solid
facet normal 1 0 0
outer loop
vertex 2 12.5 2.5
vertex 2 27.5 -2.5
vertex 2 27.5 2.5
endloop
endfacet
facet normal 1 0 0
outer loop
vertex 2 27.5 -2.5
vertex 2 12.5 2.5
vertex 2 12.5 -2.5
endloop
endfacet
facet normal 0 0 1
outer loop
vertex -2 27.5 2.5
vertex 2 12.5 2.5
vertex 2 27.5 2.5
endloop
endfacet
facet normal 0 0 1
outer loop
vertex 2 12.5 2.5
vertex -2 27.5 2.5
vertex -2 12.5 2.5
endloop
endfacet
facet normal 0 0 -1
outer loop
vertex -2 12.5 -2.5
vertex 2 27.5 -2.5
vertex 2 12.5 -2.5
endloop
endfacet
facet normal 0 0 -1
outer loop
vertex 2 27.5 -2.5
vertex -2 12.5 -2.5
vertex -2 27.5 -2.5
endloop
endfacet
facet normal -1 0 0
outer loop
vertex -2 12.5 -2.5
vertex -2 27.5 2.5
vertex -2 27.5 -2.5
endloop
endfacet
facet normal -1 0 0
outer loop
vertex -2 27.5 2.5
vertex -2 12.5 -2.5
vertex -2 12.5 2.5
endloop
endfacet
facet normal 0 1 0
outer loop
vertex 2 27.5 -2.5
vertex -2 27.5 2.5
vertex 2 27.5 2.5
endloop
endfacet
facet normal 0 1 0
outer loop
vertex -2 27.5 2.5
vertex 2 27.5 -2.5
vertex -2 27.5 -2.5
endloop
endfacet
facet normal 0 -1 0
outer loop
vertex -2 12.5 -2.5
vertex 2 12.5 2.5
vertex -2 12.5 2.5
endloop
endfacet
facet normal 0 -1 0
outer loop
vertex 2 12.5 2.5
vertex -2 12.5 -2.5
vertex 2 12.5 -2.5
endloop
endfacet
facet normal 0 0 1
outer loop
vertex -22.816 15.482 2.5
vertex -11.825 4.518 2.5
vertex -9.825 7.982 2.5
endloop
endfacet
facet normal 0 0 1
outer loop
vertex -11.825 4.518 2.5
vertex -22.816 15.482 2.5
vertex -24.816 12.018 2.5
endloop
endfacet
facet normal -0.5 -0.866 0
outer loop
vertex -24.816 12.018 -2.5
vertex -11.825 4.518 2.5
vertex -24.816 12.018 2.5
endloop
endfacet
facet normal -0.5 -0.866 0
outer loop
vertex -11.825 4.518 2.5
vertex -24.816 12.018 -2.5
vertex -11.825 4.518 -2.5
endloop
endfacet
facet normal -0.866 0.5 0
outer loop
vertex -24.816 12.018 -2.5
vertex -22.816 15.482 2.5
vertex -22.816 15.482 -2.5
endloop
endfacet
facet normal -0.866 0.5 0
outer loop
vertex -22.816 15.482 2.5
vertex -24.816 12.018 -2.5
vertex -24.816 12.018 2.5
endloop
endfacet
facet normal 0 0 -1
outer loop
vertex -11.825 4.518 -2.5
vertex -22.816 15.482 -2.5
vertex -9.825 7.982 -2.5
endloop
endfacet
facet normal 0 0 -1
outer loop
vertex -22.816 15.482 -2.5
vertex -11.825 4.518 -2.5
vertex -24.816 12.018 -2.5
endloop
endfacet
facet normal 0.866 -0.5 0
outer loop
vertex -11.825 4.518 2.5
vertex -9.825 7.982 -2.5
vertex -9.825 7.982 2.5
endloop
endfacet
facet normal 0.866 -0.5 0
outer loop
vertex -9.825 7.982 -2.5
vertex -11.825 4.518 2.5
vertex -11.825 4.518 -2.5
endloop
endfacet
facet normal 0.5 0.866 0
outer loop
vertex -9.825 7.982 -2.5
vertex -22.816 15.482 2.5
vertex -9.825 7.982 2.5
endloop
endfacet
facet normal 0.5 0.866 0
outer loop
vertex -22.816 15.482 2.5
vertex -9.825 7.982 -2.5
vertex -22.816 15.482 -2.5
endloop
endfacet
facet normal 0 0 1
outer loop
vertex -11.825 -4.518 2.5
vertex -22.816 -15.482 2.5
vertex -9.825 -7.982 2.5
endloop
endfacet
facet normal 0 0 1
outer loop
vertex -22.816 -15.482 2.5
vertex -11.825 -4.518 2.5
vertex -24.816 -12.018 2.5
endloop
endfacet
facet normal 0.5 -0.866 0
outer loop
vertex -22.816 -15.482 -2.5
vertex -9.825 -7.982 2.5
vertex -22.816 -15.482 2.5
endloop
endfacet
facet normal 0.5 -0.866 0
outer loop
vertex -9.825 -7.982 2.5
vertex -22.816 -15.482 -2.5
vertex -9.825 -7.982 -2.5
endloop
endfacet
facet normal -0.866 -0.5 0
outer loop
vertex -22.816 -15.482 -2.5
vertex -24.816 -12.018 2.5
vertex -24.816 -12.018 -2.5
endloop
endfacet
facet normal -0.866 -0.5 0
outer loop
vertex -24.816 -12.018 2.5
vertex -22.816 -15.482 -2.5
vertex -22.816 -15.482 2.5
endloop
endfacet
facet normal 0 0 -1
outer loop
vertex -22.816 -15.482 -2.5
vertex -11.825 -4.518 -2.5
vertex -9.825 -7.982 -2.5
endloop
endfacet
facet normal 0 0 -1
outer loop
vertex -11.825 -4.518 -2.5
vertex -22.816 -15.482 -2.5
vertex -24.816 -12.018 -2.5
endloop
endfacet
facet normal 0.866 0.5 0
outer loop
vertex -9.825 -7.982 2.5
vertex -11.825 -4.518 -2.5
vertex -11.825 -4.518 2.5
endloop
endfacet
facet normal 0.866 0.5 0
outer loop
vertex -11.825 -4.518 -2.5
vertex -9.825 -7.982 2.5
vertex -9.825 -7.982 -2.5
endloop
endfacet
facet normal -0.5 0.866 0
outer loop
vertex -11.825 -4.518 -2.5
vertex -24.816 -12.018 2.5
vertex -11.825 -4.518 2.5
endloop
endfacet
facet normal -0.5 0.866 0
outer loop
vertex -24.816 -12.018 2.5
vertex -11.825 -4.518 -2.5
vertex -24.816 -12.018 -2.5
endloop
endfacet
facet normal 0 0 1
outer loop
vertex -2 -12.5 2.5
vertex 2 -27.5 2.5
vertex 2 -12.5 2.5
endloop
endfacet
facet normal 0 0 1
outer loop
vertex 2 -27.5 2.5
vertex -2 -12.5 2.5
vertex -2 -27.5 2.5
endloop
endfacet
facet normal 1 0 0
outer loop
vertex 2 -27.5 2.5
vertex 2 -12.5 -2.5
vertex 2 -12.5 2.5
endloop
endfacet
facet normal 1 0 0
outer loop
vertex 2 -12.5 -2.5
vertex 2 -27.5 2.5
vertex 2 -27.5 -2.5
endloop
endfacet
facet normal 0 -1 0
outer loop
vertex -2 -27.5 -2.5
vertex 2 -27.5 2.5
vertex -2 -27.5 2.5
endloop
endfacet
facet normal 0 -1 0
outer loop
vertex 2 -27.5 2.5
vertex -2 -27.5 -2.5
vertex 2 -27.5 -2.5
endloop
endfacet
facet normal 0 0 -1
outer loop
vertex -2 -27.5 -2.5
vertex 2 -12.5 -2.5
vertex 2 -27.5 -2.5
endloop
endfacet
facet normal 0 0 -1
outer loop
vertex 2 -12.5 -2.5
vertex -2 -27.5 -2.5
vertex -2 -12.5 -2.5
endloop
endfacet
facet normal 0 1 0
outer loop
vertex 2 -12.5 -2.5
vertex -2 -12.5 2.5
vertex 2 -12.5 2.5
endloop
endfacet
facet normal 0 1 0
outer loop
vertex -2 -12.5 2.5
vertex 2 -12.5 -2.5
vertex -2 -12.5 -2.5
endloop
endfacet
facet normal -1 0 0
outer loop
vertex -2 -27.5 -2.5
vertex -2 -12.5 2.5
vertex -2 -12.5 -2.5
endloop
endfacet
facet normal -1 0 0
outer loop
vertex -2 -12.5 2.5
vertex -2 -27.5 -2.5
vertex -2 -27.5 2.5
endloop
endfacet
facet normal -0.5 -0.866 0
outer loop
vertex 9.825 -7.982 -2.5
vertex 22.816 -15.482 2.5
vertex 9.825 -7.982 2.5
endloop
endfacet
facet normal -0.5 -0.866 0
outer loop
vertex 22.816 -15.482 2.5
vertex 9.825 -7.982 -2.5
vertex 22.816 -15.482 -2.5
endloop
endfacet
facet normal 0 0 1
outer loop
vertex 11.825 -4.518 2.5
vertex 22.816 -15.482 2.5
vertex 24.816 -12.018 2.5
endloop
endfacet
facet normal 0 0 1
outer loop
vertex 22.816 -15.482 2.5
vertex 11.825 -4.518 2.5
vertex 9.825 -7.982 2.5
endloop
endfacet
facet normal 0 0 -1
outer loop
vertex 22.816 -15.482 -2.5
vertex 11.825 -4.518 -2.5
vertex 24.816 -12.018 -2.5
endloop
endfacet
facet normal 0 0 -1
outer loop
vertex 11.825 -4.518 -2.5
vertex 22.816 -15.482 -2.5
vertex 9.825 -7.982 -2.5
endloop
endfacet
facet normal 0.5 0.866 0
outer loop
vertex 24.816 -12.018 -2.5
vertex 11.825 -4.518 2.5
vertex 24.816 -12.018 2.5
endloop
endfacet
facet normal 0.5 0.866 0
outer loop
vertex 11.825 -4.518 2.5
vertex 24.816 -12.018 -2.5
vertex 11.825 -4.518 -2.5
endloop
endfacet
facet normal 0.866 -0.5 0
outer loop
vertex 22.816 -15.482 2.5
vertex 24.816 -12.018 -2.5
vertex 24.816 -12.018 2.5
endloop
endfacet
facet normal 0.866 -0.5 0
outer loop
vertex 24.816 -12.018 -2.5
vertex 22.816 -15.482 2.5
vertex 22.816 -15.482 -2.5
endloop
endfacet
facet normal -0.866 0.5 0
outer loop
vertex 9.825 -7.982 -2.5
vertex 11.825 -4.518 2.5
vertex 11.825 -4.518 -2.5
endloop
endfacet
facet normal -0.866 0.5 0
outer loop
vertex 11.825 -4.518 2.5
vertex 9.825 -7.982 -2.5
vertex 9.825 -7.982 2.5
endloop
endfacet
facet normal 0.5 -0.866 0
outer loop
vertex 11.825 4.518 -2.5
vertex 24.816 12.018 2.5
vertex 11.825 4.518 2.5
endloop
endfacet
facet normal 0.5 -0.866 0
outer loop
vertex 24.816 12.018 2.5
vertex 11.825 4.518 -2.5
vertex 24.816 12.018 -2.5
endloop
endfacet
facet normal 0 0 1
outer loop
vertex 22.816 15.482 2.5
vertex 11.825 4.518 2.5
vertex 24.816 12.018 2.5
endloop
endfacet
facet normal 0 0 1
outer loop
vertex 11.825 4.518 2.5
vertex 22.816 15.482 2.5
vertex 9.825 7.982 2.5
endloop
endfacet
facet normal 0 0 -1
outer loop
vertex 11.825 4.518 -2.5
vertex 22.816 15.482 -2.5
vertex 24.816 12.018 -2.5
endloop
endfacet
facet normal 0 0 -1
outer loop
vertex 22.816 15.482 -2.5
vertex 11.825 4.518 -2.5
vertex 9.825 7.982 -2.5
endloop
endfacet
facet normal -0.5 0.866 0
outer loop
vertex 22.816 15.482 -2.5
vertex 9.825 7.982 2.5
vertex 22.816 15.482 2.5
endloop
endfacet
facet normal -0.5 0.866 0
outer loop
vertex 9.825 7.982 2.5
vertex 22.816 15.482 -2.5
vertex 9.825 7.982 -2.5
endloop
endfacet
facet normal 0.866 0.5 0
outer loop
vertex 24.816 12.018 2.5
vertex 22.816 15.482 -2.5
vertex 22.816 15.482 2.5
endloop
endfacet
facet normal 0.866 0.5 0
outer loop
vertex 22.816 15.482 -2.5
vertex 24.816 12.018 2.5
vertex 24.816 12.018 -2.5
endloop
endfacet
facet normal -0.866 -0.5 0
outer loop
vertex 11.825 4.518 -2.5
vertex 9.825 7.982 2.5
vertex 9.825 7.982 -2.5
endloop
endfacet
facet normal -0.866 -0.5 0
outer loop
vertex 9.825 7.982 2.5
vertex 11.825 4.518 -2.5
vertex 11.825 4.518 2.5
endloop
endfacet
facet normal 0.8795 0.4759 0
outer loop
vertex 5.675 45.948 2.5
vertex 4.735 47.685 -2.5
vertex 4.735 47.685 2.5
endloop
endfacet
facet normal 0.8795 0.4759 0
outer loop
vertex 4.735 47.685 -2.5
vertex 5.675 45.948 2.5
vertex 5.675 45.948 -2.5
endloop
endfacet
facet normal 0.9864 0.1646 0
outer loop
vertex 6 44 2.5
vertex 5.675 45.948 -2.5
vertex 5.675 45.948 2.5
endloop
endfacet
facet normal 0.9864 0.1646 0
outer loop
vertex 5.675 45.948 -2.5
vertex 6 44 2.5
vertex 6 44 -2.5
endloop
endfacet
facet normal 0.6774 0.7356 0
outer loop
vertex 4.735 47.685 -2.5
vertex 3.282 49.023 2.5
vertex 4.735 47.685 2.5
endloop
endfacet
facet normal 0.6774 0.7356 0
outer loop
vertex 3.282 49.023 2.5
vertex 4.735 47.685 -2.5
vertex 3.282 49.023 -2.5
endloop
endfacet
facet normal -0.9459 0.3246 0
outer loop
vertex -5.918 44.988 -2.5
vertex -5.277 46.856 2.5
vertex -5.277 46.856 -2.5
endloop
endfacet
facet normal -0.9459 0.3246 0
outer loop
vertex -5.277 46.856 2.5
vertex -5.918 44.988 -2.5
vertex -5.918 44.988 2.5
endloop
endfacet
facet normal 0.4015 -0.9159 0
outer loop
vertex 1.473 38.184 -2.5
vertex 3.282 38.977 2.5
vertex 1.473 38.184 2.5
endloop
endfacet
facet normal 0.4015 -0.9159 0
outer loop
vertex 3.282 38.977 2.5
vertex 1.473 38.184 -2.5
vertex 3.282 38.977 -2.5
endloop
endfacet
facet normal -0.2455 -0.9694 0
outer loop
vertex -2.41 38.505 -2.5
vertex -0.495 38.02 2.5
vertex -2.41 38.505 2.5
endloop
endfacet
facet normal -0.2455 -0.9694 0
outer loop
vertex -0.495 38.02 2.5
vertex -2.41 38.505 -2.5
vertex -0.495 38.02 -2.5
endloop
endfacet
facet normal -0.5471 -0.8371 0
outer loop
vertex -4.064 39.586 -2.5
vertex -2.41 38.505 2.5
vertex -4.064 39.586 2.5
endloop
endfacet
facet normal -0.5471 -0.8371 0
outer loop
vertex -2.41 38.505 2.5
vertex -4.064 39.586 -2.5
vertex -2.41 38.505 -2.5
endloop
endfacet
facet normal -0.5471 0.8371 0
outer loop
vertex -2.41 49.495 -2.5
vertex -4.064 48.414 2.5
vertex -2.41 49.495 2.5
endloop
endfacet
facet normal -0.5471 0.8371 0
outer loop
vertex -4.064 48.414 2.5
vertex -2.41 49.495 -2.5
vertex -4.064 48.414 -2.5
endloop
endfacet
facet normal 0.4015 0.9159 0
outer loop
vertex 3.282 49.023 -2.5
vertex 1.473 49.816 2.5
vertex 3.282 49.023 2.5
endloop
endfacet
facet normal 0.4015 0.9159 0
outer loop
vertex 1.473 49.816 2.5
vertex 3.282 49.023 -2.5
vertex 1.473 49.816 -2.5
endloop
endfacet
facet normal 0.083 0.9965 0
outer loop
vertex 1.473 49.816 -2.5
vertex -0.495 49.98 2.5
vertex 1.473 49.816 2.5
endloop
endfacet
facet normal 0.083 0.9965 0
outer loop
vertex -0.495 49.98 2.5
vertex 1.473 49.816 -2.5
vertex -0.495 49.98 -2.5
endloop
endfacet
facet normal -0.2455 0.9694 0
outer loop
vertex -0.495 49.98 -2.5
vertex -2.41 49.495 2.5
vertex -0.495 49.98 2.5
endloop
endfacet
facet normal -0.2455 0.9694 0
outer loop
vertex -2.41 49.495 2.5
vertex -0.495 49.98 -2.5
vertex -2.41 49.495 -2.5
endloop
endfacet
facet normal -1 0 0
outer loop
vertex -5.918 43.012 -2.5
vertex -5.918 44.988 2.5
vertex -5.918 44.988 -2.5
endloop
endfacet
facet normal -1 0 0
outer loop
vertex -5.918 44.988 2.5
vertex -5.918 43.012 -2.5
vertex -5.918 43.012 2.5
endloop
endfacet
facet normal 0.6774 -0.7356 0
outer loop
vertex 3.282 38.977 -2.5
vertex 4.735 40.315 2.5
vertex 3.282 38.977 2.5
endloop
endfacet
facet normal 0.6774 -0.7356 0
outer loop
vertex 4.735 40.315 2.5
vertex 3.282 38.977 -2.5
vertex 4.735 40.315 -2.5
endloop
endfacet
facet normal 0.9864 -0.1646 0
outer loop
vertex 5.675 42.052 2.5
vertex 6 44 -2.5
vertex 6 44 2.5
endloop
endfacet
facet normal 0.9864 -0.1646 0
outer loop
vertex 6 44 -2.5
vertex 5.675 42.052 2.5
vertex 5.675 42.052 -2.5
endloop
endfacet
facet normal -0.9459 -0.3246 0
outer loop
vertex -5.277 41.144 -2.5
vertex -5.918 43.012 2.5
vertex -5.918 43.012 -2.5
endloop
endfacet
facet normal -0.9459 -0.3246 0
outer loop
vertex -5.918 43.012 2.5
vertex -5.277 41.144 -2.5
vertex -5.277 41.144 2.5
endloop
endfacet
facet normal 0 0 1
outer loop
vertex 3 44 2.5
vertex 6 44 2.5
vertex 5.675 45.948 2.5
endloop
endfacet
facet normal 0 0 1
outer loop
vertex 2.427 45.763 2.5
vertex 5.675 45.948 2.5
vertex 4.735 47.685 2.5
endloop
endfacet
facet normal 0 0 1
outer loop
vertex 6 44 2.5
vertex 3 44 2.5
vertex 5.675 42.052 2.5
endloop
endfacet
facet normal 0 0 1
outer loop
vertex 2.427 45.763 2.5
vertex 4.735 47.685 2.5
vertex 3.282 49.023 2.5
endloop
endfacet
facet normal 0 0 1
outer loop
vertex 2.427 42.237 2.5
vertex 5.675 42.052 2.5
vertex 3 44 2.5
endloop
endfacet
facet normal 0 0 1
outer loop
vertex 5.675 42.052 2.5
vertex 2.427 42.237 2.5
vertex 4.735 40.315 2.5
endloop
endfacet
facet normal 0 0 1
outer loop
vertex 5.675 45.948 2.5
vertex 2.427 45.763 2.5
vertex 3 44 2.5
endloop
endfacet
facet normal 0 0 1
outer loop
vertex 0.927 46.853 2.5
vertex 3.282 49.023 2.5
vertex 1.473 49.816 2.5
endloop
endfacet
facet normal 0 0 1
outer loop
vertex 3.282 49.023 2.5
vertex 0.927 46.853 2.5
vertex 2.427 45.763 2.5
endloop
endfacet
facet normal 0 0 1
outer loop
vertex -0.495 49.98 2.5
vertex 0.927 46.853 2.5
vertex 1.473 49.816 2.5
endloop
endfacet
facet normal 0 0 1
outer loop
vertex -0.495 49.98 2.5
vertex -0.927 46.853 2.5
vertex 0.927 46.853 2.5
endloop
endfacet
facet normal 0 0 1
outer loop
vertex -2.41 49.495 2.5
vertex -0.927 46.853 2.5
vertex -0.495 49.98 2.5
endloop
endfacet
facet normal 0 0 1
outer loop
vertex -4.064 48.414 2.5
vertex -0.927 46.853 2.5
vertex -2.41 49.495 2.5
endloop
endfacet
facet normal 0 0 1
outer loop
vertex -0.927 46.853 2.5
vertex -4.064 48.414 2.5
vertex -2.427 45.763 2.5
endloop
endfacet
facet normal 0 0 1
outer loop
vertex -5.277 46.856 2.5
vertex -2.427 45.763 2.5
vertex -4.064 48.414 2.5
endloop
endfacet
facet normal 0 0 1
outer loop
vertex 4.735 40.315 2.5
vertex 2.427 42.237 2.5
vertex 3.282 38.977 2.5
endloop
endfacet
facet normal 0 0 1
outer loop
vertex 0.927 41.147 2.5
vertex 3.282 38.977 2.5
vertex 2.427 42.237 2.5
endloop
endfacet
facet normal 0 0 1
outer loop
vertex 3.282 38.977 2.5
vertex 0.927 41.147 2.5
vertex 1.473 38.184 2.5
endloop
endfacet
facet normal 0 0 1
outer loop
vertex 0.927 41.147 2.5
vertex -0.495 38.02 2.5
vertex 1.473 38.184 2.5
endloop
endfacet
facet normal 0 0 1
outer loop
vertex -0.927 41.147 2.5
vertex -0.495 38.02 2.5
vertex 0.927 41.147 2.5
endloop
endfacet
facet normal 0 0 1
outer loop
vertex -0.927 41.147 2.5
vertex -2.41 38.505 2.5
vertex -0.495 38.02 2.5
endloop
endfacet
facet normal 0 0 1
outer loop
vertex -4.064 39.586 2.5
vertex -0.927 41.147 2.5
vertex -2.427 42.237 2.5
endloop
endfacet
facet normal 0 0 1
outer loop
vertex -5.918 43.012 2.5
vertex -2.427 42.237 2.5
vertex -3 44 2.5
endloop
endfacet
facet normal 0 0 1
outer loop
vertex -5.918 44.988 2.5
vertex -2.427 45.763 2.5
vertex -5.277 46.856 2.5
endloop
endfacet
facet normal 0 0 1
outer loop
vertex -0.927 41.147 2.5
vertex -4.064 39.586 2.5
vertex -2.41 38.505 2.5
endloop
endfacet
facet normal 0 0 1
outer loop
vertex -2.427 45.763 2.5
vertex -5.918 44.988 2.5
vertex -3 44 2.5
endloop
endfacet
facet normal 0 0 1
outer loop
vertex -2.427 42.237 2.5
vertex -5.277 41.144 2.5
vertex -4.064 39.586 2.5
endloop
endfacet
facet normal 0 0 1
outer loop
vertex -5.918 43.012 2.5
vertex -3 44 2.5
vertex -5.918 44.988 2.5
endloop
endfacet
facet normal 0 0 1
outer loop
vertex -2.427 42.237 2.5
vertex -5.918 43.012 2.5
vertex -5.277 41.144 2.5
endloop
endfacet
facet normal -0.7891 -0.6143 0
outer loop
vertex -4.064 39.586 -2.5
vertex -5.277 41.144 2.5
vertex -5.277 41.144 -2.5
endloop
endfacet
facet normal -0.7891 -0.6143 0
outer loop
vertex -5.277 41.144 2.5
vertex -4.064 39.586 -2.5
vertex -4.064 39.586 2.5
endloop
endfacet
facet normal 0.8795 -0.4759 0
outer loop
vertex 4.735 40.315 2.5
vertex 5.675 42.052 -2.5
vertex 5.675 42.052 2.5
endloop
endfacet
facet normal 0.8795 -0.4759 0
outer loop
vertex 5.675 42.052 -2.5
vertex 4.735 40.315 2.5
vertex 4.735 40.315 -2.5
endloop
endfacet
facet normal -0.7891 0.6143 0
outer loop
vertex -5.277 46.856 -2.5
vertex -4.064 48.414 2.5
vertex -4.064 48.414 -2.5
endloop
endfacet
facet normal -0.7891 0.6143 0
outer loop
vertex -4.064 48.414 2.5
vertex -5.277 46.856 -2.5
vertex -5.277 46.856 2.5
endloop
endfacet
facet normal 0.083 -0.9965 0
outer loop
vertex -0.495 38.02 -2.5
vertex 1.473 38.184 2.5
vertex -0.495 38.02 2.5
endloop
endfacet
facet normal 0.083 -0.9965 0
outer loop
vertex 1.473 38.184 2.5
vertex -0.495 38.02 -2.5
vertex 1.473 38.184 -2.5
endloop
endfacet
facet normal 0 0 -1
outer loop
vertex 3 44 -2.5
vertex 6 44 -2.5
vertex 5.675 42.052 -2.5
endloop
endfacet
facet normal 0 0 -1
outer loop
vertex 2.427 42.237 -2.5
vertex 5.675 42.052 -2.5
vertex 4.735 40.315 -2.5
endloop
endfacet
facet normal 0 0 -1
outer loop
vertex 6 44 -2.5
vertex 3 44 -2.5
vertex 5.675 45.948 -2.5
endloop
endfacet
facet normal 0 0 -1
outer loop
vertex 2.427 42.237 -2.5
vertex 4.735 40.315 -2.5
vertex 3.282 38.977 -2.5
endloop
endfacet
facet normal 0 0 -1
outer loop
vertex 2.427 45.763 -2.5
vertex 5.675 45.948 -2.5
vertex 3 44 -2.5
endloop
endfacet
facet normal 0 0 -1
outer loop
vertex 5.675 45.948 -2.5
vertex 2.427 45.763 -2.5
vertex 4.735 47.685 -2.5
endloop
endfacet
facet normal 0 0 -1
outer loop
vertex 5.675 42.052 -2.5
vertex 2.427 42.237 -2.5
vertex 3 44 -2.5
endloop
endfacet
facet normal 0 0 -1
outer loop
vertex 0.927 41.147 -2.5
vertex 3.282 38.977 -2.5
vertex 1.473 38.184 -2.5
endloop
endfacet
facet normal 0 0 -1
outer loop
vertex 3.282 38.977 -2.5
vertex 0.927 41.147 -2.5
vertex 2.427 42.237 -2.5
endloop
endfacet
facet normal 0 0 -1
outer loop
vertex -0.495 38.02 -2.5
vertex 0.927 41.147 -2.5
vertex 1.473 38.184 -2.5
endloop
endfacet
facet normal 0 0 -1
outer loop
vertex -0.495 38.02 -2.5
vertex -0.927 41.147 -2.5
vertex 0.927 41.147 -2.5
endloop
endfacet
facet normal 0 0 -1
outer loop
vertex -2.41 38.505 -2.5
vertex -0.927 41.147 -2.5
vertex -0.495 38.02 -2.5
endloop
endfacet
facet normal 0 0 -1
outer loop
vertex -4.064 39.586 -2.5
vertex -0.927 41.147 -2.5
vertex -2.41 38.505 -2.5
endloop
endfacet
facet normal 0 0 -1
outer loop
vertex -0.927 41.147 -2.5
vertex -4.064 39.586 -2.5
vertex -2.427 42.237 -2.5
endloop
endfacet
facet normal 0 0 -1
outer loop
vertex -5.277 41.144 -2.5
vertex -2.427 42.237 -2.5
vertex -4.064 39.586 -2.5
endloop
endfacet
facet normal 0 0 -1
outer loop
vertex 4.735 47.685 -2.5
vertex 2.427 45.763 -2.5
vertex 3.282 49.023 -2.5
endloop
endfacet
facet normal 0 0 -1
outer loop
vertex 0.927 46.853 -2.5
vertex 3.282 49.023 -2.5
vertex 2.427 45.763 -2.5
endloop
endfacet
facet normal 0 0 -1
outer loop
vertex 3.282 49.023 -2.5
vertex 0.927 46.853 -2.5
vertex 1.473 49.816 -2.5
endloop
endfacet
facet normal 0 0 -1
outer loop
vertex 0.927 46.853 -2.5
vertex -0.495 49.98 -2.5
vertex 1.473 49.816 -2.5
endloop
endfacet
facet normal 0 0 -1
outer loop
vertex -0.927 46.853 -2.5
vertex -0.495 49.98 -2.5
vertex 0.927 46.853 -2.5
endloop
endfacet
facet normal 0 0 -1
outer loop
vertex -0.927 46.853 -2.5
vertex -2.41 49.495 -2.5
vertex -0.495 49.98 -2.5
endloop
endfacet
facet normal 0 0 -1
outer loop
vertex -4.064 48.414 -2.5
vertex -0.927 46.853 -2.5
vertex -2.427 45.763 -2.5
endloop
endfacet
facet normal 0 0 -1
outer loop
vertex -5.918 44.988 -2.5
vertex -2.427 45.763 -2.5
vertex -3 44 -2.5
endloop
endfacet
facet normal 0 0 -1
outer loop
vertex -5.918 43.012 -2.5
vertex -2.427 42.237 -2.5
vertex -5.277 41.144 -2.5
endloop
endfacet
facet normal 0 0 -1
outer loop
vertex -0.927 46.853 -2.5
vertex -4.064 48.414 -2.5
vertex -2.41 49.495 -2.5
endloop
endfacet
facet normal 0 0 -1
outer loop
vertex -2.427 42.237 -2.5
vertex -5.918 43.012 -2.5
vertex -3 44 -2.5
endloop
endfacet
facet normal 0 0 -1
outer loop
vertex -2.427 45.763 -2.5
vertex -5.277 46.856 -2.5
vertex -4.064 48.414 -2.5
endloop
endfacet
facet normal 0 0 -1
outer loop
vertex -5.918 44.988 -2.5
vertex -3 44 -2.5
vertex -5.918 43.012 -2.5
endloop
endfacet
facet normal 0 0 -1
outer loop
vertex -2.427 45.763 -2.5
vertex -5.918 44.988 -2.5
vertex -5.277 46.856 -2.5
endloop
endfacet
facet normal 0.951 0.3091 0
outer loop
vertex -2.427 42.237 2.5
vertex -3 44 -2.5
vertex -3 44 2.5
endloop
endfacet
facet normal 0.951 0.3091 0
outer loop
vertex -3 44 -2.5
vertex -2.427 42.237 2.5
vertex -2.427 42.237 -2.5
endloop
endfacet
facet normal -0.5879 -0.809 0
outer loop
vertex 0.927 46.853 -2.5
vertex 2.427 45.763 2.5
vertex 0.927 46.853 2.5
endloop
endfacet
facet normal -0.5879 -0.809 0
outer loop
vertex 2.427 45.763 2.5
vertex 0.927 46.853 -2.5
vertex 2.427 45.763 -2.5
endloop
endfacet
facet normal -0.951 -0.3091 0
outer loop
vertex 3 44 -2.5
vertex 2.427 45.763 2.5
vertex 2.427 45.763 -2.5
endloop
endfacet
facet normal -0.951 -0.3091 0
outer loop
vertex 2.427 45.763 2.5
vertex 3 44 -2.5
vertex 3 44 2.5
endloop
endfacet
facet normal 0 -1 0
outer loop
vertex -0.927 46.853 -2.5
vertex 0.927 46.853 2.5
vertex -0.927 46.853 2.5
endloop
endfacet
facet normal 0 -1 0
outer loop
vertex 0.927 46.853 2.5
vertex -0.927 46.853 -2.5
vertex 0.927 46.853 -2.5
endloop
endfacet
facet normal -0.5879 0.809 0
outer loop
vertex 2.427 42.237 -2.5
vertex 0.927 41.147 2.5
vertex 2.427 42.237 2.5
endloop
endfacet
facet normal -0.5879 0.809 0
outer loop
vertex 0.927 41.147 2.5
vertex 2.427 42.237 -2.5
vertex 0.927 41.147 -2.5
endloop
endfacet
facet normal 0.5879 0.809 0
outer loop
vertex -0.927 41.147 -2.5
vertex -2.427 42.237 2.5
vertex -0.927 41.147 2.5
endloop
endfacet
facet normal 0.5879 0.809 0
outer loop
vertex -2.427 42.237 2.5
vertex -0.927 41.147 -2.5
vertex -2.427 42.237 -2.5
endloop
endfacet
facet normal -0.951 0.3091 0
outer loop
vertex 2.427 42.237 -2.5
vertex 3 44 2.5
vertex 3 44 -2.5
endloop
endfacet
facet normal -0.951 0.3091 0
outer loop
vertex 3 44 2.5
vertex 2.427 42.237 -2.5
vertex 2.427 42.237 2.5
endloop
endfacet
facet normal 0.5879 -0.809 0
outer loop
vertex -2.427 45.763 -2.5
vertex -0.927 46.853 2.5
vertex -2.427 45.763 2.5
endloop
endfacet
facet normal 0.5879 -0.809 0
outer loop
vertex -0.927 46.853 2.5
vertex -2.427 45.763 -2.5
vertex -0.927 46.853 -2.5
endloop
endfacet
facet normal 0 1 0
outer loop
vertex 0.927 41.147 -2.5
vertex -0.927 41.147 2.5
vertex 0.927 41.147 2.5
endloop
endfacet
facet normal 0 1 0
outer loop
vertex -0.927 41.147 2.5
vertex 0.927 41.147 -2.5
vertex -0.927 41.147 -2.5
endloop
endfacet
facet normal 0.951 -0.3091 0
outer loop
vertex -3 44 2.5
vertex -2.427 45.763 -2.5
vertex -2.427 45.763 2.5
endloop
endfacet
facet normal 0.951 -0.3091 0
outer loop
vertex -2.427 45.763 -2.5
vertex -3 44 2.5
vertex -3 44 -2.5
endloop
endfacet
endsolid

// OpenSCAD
h = 5;
filename = "fish.dxf";
scale = 0.4;

module feature(){
		translate([-4,32,0])scale([scale,scale,1])translate([0,0,-h/2])linear_extrude(height = h) import(filename);
}

module six_feature(){
	union() {
		for(i = [0:360 / 6:360]){
			rotate([0,0,i]){
				feature();
				#translate([0,20,0])cube([4,15,5], center=true);
			}
		}
	}
}

module base(){
	difference(){
		scale([0.7,0.7,1])translate([0,0,-h/2])linear_extrude(height = h) import("snowflake.dxf");
		difference(){
			translate([0,0,-2.5])cylinder(h,40,40);
			translate([0,0,-2.5])cylinder(h,20,20);
		}
	}
}


module loop() {
	translate([0,44,0]) {
		union(){
			difference() {
				cylinder(h,6,6, center = true);
				cylinder(h,3,3, center = true);
			}
			//translate([0,-10,0])cube([5,10,5], center = true);
		}
	}
}


union() {
	six_feature();
	base();
	loop();
}

//translate([0,0,-5]) color([0,1,0]) cylinder(h,40,40);
